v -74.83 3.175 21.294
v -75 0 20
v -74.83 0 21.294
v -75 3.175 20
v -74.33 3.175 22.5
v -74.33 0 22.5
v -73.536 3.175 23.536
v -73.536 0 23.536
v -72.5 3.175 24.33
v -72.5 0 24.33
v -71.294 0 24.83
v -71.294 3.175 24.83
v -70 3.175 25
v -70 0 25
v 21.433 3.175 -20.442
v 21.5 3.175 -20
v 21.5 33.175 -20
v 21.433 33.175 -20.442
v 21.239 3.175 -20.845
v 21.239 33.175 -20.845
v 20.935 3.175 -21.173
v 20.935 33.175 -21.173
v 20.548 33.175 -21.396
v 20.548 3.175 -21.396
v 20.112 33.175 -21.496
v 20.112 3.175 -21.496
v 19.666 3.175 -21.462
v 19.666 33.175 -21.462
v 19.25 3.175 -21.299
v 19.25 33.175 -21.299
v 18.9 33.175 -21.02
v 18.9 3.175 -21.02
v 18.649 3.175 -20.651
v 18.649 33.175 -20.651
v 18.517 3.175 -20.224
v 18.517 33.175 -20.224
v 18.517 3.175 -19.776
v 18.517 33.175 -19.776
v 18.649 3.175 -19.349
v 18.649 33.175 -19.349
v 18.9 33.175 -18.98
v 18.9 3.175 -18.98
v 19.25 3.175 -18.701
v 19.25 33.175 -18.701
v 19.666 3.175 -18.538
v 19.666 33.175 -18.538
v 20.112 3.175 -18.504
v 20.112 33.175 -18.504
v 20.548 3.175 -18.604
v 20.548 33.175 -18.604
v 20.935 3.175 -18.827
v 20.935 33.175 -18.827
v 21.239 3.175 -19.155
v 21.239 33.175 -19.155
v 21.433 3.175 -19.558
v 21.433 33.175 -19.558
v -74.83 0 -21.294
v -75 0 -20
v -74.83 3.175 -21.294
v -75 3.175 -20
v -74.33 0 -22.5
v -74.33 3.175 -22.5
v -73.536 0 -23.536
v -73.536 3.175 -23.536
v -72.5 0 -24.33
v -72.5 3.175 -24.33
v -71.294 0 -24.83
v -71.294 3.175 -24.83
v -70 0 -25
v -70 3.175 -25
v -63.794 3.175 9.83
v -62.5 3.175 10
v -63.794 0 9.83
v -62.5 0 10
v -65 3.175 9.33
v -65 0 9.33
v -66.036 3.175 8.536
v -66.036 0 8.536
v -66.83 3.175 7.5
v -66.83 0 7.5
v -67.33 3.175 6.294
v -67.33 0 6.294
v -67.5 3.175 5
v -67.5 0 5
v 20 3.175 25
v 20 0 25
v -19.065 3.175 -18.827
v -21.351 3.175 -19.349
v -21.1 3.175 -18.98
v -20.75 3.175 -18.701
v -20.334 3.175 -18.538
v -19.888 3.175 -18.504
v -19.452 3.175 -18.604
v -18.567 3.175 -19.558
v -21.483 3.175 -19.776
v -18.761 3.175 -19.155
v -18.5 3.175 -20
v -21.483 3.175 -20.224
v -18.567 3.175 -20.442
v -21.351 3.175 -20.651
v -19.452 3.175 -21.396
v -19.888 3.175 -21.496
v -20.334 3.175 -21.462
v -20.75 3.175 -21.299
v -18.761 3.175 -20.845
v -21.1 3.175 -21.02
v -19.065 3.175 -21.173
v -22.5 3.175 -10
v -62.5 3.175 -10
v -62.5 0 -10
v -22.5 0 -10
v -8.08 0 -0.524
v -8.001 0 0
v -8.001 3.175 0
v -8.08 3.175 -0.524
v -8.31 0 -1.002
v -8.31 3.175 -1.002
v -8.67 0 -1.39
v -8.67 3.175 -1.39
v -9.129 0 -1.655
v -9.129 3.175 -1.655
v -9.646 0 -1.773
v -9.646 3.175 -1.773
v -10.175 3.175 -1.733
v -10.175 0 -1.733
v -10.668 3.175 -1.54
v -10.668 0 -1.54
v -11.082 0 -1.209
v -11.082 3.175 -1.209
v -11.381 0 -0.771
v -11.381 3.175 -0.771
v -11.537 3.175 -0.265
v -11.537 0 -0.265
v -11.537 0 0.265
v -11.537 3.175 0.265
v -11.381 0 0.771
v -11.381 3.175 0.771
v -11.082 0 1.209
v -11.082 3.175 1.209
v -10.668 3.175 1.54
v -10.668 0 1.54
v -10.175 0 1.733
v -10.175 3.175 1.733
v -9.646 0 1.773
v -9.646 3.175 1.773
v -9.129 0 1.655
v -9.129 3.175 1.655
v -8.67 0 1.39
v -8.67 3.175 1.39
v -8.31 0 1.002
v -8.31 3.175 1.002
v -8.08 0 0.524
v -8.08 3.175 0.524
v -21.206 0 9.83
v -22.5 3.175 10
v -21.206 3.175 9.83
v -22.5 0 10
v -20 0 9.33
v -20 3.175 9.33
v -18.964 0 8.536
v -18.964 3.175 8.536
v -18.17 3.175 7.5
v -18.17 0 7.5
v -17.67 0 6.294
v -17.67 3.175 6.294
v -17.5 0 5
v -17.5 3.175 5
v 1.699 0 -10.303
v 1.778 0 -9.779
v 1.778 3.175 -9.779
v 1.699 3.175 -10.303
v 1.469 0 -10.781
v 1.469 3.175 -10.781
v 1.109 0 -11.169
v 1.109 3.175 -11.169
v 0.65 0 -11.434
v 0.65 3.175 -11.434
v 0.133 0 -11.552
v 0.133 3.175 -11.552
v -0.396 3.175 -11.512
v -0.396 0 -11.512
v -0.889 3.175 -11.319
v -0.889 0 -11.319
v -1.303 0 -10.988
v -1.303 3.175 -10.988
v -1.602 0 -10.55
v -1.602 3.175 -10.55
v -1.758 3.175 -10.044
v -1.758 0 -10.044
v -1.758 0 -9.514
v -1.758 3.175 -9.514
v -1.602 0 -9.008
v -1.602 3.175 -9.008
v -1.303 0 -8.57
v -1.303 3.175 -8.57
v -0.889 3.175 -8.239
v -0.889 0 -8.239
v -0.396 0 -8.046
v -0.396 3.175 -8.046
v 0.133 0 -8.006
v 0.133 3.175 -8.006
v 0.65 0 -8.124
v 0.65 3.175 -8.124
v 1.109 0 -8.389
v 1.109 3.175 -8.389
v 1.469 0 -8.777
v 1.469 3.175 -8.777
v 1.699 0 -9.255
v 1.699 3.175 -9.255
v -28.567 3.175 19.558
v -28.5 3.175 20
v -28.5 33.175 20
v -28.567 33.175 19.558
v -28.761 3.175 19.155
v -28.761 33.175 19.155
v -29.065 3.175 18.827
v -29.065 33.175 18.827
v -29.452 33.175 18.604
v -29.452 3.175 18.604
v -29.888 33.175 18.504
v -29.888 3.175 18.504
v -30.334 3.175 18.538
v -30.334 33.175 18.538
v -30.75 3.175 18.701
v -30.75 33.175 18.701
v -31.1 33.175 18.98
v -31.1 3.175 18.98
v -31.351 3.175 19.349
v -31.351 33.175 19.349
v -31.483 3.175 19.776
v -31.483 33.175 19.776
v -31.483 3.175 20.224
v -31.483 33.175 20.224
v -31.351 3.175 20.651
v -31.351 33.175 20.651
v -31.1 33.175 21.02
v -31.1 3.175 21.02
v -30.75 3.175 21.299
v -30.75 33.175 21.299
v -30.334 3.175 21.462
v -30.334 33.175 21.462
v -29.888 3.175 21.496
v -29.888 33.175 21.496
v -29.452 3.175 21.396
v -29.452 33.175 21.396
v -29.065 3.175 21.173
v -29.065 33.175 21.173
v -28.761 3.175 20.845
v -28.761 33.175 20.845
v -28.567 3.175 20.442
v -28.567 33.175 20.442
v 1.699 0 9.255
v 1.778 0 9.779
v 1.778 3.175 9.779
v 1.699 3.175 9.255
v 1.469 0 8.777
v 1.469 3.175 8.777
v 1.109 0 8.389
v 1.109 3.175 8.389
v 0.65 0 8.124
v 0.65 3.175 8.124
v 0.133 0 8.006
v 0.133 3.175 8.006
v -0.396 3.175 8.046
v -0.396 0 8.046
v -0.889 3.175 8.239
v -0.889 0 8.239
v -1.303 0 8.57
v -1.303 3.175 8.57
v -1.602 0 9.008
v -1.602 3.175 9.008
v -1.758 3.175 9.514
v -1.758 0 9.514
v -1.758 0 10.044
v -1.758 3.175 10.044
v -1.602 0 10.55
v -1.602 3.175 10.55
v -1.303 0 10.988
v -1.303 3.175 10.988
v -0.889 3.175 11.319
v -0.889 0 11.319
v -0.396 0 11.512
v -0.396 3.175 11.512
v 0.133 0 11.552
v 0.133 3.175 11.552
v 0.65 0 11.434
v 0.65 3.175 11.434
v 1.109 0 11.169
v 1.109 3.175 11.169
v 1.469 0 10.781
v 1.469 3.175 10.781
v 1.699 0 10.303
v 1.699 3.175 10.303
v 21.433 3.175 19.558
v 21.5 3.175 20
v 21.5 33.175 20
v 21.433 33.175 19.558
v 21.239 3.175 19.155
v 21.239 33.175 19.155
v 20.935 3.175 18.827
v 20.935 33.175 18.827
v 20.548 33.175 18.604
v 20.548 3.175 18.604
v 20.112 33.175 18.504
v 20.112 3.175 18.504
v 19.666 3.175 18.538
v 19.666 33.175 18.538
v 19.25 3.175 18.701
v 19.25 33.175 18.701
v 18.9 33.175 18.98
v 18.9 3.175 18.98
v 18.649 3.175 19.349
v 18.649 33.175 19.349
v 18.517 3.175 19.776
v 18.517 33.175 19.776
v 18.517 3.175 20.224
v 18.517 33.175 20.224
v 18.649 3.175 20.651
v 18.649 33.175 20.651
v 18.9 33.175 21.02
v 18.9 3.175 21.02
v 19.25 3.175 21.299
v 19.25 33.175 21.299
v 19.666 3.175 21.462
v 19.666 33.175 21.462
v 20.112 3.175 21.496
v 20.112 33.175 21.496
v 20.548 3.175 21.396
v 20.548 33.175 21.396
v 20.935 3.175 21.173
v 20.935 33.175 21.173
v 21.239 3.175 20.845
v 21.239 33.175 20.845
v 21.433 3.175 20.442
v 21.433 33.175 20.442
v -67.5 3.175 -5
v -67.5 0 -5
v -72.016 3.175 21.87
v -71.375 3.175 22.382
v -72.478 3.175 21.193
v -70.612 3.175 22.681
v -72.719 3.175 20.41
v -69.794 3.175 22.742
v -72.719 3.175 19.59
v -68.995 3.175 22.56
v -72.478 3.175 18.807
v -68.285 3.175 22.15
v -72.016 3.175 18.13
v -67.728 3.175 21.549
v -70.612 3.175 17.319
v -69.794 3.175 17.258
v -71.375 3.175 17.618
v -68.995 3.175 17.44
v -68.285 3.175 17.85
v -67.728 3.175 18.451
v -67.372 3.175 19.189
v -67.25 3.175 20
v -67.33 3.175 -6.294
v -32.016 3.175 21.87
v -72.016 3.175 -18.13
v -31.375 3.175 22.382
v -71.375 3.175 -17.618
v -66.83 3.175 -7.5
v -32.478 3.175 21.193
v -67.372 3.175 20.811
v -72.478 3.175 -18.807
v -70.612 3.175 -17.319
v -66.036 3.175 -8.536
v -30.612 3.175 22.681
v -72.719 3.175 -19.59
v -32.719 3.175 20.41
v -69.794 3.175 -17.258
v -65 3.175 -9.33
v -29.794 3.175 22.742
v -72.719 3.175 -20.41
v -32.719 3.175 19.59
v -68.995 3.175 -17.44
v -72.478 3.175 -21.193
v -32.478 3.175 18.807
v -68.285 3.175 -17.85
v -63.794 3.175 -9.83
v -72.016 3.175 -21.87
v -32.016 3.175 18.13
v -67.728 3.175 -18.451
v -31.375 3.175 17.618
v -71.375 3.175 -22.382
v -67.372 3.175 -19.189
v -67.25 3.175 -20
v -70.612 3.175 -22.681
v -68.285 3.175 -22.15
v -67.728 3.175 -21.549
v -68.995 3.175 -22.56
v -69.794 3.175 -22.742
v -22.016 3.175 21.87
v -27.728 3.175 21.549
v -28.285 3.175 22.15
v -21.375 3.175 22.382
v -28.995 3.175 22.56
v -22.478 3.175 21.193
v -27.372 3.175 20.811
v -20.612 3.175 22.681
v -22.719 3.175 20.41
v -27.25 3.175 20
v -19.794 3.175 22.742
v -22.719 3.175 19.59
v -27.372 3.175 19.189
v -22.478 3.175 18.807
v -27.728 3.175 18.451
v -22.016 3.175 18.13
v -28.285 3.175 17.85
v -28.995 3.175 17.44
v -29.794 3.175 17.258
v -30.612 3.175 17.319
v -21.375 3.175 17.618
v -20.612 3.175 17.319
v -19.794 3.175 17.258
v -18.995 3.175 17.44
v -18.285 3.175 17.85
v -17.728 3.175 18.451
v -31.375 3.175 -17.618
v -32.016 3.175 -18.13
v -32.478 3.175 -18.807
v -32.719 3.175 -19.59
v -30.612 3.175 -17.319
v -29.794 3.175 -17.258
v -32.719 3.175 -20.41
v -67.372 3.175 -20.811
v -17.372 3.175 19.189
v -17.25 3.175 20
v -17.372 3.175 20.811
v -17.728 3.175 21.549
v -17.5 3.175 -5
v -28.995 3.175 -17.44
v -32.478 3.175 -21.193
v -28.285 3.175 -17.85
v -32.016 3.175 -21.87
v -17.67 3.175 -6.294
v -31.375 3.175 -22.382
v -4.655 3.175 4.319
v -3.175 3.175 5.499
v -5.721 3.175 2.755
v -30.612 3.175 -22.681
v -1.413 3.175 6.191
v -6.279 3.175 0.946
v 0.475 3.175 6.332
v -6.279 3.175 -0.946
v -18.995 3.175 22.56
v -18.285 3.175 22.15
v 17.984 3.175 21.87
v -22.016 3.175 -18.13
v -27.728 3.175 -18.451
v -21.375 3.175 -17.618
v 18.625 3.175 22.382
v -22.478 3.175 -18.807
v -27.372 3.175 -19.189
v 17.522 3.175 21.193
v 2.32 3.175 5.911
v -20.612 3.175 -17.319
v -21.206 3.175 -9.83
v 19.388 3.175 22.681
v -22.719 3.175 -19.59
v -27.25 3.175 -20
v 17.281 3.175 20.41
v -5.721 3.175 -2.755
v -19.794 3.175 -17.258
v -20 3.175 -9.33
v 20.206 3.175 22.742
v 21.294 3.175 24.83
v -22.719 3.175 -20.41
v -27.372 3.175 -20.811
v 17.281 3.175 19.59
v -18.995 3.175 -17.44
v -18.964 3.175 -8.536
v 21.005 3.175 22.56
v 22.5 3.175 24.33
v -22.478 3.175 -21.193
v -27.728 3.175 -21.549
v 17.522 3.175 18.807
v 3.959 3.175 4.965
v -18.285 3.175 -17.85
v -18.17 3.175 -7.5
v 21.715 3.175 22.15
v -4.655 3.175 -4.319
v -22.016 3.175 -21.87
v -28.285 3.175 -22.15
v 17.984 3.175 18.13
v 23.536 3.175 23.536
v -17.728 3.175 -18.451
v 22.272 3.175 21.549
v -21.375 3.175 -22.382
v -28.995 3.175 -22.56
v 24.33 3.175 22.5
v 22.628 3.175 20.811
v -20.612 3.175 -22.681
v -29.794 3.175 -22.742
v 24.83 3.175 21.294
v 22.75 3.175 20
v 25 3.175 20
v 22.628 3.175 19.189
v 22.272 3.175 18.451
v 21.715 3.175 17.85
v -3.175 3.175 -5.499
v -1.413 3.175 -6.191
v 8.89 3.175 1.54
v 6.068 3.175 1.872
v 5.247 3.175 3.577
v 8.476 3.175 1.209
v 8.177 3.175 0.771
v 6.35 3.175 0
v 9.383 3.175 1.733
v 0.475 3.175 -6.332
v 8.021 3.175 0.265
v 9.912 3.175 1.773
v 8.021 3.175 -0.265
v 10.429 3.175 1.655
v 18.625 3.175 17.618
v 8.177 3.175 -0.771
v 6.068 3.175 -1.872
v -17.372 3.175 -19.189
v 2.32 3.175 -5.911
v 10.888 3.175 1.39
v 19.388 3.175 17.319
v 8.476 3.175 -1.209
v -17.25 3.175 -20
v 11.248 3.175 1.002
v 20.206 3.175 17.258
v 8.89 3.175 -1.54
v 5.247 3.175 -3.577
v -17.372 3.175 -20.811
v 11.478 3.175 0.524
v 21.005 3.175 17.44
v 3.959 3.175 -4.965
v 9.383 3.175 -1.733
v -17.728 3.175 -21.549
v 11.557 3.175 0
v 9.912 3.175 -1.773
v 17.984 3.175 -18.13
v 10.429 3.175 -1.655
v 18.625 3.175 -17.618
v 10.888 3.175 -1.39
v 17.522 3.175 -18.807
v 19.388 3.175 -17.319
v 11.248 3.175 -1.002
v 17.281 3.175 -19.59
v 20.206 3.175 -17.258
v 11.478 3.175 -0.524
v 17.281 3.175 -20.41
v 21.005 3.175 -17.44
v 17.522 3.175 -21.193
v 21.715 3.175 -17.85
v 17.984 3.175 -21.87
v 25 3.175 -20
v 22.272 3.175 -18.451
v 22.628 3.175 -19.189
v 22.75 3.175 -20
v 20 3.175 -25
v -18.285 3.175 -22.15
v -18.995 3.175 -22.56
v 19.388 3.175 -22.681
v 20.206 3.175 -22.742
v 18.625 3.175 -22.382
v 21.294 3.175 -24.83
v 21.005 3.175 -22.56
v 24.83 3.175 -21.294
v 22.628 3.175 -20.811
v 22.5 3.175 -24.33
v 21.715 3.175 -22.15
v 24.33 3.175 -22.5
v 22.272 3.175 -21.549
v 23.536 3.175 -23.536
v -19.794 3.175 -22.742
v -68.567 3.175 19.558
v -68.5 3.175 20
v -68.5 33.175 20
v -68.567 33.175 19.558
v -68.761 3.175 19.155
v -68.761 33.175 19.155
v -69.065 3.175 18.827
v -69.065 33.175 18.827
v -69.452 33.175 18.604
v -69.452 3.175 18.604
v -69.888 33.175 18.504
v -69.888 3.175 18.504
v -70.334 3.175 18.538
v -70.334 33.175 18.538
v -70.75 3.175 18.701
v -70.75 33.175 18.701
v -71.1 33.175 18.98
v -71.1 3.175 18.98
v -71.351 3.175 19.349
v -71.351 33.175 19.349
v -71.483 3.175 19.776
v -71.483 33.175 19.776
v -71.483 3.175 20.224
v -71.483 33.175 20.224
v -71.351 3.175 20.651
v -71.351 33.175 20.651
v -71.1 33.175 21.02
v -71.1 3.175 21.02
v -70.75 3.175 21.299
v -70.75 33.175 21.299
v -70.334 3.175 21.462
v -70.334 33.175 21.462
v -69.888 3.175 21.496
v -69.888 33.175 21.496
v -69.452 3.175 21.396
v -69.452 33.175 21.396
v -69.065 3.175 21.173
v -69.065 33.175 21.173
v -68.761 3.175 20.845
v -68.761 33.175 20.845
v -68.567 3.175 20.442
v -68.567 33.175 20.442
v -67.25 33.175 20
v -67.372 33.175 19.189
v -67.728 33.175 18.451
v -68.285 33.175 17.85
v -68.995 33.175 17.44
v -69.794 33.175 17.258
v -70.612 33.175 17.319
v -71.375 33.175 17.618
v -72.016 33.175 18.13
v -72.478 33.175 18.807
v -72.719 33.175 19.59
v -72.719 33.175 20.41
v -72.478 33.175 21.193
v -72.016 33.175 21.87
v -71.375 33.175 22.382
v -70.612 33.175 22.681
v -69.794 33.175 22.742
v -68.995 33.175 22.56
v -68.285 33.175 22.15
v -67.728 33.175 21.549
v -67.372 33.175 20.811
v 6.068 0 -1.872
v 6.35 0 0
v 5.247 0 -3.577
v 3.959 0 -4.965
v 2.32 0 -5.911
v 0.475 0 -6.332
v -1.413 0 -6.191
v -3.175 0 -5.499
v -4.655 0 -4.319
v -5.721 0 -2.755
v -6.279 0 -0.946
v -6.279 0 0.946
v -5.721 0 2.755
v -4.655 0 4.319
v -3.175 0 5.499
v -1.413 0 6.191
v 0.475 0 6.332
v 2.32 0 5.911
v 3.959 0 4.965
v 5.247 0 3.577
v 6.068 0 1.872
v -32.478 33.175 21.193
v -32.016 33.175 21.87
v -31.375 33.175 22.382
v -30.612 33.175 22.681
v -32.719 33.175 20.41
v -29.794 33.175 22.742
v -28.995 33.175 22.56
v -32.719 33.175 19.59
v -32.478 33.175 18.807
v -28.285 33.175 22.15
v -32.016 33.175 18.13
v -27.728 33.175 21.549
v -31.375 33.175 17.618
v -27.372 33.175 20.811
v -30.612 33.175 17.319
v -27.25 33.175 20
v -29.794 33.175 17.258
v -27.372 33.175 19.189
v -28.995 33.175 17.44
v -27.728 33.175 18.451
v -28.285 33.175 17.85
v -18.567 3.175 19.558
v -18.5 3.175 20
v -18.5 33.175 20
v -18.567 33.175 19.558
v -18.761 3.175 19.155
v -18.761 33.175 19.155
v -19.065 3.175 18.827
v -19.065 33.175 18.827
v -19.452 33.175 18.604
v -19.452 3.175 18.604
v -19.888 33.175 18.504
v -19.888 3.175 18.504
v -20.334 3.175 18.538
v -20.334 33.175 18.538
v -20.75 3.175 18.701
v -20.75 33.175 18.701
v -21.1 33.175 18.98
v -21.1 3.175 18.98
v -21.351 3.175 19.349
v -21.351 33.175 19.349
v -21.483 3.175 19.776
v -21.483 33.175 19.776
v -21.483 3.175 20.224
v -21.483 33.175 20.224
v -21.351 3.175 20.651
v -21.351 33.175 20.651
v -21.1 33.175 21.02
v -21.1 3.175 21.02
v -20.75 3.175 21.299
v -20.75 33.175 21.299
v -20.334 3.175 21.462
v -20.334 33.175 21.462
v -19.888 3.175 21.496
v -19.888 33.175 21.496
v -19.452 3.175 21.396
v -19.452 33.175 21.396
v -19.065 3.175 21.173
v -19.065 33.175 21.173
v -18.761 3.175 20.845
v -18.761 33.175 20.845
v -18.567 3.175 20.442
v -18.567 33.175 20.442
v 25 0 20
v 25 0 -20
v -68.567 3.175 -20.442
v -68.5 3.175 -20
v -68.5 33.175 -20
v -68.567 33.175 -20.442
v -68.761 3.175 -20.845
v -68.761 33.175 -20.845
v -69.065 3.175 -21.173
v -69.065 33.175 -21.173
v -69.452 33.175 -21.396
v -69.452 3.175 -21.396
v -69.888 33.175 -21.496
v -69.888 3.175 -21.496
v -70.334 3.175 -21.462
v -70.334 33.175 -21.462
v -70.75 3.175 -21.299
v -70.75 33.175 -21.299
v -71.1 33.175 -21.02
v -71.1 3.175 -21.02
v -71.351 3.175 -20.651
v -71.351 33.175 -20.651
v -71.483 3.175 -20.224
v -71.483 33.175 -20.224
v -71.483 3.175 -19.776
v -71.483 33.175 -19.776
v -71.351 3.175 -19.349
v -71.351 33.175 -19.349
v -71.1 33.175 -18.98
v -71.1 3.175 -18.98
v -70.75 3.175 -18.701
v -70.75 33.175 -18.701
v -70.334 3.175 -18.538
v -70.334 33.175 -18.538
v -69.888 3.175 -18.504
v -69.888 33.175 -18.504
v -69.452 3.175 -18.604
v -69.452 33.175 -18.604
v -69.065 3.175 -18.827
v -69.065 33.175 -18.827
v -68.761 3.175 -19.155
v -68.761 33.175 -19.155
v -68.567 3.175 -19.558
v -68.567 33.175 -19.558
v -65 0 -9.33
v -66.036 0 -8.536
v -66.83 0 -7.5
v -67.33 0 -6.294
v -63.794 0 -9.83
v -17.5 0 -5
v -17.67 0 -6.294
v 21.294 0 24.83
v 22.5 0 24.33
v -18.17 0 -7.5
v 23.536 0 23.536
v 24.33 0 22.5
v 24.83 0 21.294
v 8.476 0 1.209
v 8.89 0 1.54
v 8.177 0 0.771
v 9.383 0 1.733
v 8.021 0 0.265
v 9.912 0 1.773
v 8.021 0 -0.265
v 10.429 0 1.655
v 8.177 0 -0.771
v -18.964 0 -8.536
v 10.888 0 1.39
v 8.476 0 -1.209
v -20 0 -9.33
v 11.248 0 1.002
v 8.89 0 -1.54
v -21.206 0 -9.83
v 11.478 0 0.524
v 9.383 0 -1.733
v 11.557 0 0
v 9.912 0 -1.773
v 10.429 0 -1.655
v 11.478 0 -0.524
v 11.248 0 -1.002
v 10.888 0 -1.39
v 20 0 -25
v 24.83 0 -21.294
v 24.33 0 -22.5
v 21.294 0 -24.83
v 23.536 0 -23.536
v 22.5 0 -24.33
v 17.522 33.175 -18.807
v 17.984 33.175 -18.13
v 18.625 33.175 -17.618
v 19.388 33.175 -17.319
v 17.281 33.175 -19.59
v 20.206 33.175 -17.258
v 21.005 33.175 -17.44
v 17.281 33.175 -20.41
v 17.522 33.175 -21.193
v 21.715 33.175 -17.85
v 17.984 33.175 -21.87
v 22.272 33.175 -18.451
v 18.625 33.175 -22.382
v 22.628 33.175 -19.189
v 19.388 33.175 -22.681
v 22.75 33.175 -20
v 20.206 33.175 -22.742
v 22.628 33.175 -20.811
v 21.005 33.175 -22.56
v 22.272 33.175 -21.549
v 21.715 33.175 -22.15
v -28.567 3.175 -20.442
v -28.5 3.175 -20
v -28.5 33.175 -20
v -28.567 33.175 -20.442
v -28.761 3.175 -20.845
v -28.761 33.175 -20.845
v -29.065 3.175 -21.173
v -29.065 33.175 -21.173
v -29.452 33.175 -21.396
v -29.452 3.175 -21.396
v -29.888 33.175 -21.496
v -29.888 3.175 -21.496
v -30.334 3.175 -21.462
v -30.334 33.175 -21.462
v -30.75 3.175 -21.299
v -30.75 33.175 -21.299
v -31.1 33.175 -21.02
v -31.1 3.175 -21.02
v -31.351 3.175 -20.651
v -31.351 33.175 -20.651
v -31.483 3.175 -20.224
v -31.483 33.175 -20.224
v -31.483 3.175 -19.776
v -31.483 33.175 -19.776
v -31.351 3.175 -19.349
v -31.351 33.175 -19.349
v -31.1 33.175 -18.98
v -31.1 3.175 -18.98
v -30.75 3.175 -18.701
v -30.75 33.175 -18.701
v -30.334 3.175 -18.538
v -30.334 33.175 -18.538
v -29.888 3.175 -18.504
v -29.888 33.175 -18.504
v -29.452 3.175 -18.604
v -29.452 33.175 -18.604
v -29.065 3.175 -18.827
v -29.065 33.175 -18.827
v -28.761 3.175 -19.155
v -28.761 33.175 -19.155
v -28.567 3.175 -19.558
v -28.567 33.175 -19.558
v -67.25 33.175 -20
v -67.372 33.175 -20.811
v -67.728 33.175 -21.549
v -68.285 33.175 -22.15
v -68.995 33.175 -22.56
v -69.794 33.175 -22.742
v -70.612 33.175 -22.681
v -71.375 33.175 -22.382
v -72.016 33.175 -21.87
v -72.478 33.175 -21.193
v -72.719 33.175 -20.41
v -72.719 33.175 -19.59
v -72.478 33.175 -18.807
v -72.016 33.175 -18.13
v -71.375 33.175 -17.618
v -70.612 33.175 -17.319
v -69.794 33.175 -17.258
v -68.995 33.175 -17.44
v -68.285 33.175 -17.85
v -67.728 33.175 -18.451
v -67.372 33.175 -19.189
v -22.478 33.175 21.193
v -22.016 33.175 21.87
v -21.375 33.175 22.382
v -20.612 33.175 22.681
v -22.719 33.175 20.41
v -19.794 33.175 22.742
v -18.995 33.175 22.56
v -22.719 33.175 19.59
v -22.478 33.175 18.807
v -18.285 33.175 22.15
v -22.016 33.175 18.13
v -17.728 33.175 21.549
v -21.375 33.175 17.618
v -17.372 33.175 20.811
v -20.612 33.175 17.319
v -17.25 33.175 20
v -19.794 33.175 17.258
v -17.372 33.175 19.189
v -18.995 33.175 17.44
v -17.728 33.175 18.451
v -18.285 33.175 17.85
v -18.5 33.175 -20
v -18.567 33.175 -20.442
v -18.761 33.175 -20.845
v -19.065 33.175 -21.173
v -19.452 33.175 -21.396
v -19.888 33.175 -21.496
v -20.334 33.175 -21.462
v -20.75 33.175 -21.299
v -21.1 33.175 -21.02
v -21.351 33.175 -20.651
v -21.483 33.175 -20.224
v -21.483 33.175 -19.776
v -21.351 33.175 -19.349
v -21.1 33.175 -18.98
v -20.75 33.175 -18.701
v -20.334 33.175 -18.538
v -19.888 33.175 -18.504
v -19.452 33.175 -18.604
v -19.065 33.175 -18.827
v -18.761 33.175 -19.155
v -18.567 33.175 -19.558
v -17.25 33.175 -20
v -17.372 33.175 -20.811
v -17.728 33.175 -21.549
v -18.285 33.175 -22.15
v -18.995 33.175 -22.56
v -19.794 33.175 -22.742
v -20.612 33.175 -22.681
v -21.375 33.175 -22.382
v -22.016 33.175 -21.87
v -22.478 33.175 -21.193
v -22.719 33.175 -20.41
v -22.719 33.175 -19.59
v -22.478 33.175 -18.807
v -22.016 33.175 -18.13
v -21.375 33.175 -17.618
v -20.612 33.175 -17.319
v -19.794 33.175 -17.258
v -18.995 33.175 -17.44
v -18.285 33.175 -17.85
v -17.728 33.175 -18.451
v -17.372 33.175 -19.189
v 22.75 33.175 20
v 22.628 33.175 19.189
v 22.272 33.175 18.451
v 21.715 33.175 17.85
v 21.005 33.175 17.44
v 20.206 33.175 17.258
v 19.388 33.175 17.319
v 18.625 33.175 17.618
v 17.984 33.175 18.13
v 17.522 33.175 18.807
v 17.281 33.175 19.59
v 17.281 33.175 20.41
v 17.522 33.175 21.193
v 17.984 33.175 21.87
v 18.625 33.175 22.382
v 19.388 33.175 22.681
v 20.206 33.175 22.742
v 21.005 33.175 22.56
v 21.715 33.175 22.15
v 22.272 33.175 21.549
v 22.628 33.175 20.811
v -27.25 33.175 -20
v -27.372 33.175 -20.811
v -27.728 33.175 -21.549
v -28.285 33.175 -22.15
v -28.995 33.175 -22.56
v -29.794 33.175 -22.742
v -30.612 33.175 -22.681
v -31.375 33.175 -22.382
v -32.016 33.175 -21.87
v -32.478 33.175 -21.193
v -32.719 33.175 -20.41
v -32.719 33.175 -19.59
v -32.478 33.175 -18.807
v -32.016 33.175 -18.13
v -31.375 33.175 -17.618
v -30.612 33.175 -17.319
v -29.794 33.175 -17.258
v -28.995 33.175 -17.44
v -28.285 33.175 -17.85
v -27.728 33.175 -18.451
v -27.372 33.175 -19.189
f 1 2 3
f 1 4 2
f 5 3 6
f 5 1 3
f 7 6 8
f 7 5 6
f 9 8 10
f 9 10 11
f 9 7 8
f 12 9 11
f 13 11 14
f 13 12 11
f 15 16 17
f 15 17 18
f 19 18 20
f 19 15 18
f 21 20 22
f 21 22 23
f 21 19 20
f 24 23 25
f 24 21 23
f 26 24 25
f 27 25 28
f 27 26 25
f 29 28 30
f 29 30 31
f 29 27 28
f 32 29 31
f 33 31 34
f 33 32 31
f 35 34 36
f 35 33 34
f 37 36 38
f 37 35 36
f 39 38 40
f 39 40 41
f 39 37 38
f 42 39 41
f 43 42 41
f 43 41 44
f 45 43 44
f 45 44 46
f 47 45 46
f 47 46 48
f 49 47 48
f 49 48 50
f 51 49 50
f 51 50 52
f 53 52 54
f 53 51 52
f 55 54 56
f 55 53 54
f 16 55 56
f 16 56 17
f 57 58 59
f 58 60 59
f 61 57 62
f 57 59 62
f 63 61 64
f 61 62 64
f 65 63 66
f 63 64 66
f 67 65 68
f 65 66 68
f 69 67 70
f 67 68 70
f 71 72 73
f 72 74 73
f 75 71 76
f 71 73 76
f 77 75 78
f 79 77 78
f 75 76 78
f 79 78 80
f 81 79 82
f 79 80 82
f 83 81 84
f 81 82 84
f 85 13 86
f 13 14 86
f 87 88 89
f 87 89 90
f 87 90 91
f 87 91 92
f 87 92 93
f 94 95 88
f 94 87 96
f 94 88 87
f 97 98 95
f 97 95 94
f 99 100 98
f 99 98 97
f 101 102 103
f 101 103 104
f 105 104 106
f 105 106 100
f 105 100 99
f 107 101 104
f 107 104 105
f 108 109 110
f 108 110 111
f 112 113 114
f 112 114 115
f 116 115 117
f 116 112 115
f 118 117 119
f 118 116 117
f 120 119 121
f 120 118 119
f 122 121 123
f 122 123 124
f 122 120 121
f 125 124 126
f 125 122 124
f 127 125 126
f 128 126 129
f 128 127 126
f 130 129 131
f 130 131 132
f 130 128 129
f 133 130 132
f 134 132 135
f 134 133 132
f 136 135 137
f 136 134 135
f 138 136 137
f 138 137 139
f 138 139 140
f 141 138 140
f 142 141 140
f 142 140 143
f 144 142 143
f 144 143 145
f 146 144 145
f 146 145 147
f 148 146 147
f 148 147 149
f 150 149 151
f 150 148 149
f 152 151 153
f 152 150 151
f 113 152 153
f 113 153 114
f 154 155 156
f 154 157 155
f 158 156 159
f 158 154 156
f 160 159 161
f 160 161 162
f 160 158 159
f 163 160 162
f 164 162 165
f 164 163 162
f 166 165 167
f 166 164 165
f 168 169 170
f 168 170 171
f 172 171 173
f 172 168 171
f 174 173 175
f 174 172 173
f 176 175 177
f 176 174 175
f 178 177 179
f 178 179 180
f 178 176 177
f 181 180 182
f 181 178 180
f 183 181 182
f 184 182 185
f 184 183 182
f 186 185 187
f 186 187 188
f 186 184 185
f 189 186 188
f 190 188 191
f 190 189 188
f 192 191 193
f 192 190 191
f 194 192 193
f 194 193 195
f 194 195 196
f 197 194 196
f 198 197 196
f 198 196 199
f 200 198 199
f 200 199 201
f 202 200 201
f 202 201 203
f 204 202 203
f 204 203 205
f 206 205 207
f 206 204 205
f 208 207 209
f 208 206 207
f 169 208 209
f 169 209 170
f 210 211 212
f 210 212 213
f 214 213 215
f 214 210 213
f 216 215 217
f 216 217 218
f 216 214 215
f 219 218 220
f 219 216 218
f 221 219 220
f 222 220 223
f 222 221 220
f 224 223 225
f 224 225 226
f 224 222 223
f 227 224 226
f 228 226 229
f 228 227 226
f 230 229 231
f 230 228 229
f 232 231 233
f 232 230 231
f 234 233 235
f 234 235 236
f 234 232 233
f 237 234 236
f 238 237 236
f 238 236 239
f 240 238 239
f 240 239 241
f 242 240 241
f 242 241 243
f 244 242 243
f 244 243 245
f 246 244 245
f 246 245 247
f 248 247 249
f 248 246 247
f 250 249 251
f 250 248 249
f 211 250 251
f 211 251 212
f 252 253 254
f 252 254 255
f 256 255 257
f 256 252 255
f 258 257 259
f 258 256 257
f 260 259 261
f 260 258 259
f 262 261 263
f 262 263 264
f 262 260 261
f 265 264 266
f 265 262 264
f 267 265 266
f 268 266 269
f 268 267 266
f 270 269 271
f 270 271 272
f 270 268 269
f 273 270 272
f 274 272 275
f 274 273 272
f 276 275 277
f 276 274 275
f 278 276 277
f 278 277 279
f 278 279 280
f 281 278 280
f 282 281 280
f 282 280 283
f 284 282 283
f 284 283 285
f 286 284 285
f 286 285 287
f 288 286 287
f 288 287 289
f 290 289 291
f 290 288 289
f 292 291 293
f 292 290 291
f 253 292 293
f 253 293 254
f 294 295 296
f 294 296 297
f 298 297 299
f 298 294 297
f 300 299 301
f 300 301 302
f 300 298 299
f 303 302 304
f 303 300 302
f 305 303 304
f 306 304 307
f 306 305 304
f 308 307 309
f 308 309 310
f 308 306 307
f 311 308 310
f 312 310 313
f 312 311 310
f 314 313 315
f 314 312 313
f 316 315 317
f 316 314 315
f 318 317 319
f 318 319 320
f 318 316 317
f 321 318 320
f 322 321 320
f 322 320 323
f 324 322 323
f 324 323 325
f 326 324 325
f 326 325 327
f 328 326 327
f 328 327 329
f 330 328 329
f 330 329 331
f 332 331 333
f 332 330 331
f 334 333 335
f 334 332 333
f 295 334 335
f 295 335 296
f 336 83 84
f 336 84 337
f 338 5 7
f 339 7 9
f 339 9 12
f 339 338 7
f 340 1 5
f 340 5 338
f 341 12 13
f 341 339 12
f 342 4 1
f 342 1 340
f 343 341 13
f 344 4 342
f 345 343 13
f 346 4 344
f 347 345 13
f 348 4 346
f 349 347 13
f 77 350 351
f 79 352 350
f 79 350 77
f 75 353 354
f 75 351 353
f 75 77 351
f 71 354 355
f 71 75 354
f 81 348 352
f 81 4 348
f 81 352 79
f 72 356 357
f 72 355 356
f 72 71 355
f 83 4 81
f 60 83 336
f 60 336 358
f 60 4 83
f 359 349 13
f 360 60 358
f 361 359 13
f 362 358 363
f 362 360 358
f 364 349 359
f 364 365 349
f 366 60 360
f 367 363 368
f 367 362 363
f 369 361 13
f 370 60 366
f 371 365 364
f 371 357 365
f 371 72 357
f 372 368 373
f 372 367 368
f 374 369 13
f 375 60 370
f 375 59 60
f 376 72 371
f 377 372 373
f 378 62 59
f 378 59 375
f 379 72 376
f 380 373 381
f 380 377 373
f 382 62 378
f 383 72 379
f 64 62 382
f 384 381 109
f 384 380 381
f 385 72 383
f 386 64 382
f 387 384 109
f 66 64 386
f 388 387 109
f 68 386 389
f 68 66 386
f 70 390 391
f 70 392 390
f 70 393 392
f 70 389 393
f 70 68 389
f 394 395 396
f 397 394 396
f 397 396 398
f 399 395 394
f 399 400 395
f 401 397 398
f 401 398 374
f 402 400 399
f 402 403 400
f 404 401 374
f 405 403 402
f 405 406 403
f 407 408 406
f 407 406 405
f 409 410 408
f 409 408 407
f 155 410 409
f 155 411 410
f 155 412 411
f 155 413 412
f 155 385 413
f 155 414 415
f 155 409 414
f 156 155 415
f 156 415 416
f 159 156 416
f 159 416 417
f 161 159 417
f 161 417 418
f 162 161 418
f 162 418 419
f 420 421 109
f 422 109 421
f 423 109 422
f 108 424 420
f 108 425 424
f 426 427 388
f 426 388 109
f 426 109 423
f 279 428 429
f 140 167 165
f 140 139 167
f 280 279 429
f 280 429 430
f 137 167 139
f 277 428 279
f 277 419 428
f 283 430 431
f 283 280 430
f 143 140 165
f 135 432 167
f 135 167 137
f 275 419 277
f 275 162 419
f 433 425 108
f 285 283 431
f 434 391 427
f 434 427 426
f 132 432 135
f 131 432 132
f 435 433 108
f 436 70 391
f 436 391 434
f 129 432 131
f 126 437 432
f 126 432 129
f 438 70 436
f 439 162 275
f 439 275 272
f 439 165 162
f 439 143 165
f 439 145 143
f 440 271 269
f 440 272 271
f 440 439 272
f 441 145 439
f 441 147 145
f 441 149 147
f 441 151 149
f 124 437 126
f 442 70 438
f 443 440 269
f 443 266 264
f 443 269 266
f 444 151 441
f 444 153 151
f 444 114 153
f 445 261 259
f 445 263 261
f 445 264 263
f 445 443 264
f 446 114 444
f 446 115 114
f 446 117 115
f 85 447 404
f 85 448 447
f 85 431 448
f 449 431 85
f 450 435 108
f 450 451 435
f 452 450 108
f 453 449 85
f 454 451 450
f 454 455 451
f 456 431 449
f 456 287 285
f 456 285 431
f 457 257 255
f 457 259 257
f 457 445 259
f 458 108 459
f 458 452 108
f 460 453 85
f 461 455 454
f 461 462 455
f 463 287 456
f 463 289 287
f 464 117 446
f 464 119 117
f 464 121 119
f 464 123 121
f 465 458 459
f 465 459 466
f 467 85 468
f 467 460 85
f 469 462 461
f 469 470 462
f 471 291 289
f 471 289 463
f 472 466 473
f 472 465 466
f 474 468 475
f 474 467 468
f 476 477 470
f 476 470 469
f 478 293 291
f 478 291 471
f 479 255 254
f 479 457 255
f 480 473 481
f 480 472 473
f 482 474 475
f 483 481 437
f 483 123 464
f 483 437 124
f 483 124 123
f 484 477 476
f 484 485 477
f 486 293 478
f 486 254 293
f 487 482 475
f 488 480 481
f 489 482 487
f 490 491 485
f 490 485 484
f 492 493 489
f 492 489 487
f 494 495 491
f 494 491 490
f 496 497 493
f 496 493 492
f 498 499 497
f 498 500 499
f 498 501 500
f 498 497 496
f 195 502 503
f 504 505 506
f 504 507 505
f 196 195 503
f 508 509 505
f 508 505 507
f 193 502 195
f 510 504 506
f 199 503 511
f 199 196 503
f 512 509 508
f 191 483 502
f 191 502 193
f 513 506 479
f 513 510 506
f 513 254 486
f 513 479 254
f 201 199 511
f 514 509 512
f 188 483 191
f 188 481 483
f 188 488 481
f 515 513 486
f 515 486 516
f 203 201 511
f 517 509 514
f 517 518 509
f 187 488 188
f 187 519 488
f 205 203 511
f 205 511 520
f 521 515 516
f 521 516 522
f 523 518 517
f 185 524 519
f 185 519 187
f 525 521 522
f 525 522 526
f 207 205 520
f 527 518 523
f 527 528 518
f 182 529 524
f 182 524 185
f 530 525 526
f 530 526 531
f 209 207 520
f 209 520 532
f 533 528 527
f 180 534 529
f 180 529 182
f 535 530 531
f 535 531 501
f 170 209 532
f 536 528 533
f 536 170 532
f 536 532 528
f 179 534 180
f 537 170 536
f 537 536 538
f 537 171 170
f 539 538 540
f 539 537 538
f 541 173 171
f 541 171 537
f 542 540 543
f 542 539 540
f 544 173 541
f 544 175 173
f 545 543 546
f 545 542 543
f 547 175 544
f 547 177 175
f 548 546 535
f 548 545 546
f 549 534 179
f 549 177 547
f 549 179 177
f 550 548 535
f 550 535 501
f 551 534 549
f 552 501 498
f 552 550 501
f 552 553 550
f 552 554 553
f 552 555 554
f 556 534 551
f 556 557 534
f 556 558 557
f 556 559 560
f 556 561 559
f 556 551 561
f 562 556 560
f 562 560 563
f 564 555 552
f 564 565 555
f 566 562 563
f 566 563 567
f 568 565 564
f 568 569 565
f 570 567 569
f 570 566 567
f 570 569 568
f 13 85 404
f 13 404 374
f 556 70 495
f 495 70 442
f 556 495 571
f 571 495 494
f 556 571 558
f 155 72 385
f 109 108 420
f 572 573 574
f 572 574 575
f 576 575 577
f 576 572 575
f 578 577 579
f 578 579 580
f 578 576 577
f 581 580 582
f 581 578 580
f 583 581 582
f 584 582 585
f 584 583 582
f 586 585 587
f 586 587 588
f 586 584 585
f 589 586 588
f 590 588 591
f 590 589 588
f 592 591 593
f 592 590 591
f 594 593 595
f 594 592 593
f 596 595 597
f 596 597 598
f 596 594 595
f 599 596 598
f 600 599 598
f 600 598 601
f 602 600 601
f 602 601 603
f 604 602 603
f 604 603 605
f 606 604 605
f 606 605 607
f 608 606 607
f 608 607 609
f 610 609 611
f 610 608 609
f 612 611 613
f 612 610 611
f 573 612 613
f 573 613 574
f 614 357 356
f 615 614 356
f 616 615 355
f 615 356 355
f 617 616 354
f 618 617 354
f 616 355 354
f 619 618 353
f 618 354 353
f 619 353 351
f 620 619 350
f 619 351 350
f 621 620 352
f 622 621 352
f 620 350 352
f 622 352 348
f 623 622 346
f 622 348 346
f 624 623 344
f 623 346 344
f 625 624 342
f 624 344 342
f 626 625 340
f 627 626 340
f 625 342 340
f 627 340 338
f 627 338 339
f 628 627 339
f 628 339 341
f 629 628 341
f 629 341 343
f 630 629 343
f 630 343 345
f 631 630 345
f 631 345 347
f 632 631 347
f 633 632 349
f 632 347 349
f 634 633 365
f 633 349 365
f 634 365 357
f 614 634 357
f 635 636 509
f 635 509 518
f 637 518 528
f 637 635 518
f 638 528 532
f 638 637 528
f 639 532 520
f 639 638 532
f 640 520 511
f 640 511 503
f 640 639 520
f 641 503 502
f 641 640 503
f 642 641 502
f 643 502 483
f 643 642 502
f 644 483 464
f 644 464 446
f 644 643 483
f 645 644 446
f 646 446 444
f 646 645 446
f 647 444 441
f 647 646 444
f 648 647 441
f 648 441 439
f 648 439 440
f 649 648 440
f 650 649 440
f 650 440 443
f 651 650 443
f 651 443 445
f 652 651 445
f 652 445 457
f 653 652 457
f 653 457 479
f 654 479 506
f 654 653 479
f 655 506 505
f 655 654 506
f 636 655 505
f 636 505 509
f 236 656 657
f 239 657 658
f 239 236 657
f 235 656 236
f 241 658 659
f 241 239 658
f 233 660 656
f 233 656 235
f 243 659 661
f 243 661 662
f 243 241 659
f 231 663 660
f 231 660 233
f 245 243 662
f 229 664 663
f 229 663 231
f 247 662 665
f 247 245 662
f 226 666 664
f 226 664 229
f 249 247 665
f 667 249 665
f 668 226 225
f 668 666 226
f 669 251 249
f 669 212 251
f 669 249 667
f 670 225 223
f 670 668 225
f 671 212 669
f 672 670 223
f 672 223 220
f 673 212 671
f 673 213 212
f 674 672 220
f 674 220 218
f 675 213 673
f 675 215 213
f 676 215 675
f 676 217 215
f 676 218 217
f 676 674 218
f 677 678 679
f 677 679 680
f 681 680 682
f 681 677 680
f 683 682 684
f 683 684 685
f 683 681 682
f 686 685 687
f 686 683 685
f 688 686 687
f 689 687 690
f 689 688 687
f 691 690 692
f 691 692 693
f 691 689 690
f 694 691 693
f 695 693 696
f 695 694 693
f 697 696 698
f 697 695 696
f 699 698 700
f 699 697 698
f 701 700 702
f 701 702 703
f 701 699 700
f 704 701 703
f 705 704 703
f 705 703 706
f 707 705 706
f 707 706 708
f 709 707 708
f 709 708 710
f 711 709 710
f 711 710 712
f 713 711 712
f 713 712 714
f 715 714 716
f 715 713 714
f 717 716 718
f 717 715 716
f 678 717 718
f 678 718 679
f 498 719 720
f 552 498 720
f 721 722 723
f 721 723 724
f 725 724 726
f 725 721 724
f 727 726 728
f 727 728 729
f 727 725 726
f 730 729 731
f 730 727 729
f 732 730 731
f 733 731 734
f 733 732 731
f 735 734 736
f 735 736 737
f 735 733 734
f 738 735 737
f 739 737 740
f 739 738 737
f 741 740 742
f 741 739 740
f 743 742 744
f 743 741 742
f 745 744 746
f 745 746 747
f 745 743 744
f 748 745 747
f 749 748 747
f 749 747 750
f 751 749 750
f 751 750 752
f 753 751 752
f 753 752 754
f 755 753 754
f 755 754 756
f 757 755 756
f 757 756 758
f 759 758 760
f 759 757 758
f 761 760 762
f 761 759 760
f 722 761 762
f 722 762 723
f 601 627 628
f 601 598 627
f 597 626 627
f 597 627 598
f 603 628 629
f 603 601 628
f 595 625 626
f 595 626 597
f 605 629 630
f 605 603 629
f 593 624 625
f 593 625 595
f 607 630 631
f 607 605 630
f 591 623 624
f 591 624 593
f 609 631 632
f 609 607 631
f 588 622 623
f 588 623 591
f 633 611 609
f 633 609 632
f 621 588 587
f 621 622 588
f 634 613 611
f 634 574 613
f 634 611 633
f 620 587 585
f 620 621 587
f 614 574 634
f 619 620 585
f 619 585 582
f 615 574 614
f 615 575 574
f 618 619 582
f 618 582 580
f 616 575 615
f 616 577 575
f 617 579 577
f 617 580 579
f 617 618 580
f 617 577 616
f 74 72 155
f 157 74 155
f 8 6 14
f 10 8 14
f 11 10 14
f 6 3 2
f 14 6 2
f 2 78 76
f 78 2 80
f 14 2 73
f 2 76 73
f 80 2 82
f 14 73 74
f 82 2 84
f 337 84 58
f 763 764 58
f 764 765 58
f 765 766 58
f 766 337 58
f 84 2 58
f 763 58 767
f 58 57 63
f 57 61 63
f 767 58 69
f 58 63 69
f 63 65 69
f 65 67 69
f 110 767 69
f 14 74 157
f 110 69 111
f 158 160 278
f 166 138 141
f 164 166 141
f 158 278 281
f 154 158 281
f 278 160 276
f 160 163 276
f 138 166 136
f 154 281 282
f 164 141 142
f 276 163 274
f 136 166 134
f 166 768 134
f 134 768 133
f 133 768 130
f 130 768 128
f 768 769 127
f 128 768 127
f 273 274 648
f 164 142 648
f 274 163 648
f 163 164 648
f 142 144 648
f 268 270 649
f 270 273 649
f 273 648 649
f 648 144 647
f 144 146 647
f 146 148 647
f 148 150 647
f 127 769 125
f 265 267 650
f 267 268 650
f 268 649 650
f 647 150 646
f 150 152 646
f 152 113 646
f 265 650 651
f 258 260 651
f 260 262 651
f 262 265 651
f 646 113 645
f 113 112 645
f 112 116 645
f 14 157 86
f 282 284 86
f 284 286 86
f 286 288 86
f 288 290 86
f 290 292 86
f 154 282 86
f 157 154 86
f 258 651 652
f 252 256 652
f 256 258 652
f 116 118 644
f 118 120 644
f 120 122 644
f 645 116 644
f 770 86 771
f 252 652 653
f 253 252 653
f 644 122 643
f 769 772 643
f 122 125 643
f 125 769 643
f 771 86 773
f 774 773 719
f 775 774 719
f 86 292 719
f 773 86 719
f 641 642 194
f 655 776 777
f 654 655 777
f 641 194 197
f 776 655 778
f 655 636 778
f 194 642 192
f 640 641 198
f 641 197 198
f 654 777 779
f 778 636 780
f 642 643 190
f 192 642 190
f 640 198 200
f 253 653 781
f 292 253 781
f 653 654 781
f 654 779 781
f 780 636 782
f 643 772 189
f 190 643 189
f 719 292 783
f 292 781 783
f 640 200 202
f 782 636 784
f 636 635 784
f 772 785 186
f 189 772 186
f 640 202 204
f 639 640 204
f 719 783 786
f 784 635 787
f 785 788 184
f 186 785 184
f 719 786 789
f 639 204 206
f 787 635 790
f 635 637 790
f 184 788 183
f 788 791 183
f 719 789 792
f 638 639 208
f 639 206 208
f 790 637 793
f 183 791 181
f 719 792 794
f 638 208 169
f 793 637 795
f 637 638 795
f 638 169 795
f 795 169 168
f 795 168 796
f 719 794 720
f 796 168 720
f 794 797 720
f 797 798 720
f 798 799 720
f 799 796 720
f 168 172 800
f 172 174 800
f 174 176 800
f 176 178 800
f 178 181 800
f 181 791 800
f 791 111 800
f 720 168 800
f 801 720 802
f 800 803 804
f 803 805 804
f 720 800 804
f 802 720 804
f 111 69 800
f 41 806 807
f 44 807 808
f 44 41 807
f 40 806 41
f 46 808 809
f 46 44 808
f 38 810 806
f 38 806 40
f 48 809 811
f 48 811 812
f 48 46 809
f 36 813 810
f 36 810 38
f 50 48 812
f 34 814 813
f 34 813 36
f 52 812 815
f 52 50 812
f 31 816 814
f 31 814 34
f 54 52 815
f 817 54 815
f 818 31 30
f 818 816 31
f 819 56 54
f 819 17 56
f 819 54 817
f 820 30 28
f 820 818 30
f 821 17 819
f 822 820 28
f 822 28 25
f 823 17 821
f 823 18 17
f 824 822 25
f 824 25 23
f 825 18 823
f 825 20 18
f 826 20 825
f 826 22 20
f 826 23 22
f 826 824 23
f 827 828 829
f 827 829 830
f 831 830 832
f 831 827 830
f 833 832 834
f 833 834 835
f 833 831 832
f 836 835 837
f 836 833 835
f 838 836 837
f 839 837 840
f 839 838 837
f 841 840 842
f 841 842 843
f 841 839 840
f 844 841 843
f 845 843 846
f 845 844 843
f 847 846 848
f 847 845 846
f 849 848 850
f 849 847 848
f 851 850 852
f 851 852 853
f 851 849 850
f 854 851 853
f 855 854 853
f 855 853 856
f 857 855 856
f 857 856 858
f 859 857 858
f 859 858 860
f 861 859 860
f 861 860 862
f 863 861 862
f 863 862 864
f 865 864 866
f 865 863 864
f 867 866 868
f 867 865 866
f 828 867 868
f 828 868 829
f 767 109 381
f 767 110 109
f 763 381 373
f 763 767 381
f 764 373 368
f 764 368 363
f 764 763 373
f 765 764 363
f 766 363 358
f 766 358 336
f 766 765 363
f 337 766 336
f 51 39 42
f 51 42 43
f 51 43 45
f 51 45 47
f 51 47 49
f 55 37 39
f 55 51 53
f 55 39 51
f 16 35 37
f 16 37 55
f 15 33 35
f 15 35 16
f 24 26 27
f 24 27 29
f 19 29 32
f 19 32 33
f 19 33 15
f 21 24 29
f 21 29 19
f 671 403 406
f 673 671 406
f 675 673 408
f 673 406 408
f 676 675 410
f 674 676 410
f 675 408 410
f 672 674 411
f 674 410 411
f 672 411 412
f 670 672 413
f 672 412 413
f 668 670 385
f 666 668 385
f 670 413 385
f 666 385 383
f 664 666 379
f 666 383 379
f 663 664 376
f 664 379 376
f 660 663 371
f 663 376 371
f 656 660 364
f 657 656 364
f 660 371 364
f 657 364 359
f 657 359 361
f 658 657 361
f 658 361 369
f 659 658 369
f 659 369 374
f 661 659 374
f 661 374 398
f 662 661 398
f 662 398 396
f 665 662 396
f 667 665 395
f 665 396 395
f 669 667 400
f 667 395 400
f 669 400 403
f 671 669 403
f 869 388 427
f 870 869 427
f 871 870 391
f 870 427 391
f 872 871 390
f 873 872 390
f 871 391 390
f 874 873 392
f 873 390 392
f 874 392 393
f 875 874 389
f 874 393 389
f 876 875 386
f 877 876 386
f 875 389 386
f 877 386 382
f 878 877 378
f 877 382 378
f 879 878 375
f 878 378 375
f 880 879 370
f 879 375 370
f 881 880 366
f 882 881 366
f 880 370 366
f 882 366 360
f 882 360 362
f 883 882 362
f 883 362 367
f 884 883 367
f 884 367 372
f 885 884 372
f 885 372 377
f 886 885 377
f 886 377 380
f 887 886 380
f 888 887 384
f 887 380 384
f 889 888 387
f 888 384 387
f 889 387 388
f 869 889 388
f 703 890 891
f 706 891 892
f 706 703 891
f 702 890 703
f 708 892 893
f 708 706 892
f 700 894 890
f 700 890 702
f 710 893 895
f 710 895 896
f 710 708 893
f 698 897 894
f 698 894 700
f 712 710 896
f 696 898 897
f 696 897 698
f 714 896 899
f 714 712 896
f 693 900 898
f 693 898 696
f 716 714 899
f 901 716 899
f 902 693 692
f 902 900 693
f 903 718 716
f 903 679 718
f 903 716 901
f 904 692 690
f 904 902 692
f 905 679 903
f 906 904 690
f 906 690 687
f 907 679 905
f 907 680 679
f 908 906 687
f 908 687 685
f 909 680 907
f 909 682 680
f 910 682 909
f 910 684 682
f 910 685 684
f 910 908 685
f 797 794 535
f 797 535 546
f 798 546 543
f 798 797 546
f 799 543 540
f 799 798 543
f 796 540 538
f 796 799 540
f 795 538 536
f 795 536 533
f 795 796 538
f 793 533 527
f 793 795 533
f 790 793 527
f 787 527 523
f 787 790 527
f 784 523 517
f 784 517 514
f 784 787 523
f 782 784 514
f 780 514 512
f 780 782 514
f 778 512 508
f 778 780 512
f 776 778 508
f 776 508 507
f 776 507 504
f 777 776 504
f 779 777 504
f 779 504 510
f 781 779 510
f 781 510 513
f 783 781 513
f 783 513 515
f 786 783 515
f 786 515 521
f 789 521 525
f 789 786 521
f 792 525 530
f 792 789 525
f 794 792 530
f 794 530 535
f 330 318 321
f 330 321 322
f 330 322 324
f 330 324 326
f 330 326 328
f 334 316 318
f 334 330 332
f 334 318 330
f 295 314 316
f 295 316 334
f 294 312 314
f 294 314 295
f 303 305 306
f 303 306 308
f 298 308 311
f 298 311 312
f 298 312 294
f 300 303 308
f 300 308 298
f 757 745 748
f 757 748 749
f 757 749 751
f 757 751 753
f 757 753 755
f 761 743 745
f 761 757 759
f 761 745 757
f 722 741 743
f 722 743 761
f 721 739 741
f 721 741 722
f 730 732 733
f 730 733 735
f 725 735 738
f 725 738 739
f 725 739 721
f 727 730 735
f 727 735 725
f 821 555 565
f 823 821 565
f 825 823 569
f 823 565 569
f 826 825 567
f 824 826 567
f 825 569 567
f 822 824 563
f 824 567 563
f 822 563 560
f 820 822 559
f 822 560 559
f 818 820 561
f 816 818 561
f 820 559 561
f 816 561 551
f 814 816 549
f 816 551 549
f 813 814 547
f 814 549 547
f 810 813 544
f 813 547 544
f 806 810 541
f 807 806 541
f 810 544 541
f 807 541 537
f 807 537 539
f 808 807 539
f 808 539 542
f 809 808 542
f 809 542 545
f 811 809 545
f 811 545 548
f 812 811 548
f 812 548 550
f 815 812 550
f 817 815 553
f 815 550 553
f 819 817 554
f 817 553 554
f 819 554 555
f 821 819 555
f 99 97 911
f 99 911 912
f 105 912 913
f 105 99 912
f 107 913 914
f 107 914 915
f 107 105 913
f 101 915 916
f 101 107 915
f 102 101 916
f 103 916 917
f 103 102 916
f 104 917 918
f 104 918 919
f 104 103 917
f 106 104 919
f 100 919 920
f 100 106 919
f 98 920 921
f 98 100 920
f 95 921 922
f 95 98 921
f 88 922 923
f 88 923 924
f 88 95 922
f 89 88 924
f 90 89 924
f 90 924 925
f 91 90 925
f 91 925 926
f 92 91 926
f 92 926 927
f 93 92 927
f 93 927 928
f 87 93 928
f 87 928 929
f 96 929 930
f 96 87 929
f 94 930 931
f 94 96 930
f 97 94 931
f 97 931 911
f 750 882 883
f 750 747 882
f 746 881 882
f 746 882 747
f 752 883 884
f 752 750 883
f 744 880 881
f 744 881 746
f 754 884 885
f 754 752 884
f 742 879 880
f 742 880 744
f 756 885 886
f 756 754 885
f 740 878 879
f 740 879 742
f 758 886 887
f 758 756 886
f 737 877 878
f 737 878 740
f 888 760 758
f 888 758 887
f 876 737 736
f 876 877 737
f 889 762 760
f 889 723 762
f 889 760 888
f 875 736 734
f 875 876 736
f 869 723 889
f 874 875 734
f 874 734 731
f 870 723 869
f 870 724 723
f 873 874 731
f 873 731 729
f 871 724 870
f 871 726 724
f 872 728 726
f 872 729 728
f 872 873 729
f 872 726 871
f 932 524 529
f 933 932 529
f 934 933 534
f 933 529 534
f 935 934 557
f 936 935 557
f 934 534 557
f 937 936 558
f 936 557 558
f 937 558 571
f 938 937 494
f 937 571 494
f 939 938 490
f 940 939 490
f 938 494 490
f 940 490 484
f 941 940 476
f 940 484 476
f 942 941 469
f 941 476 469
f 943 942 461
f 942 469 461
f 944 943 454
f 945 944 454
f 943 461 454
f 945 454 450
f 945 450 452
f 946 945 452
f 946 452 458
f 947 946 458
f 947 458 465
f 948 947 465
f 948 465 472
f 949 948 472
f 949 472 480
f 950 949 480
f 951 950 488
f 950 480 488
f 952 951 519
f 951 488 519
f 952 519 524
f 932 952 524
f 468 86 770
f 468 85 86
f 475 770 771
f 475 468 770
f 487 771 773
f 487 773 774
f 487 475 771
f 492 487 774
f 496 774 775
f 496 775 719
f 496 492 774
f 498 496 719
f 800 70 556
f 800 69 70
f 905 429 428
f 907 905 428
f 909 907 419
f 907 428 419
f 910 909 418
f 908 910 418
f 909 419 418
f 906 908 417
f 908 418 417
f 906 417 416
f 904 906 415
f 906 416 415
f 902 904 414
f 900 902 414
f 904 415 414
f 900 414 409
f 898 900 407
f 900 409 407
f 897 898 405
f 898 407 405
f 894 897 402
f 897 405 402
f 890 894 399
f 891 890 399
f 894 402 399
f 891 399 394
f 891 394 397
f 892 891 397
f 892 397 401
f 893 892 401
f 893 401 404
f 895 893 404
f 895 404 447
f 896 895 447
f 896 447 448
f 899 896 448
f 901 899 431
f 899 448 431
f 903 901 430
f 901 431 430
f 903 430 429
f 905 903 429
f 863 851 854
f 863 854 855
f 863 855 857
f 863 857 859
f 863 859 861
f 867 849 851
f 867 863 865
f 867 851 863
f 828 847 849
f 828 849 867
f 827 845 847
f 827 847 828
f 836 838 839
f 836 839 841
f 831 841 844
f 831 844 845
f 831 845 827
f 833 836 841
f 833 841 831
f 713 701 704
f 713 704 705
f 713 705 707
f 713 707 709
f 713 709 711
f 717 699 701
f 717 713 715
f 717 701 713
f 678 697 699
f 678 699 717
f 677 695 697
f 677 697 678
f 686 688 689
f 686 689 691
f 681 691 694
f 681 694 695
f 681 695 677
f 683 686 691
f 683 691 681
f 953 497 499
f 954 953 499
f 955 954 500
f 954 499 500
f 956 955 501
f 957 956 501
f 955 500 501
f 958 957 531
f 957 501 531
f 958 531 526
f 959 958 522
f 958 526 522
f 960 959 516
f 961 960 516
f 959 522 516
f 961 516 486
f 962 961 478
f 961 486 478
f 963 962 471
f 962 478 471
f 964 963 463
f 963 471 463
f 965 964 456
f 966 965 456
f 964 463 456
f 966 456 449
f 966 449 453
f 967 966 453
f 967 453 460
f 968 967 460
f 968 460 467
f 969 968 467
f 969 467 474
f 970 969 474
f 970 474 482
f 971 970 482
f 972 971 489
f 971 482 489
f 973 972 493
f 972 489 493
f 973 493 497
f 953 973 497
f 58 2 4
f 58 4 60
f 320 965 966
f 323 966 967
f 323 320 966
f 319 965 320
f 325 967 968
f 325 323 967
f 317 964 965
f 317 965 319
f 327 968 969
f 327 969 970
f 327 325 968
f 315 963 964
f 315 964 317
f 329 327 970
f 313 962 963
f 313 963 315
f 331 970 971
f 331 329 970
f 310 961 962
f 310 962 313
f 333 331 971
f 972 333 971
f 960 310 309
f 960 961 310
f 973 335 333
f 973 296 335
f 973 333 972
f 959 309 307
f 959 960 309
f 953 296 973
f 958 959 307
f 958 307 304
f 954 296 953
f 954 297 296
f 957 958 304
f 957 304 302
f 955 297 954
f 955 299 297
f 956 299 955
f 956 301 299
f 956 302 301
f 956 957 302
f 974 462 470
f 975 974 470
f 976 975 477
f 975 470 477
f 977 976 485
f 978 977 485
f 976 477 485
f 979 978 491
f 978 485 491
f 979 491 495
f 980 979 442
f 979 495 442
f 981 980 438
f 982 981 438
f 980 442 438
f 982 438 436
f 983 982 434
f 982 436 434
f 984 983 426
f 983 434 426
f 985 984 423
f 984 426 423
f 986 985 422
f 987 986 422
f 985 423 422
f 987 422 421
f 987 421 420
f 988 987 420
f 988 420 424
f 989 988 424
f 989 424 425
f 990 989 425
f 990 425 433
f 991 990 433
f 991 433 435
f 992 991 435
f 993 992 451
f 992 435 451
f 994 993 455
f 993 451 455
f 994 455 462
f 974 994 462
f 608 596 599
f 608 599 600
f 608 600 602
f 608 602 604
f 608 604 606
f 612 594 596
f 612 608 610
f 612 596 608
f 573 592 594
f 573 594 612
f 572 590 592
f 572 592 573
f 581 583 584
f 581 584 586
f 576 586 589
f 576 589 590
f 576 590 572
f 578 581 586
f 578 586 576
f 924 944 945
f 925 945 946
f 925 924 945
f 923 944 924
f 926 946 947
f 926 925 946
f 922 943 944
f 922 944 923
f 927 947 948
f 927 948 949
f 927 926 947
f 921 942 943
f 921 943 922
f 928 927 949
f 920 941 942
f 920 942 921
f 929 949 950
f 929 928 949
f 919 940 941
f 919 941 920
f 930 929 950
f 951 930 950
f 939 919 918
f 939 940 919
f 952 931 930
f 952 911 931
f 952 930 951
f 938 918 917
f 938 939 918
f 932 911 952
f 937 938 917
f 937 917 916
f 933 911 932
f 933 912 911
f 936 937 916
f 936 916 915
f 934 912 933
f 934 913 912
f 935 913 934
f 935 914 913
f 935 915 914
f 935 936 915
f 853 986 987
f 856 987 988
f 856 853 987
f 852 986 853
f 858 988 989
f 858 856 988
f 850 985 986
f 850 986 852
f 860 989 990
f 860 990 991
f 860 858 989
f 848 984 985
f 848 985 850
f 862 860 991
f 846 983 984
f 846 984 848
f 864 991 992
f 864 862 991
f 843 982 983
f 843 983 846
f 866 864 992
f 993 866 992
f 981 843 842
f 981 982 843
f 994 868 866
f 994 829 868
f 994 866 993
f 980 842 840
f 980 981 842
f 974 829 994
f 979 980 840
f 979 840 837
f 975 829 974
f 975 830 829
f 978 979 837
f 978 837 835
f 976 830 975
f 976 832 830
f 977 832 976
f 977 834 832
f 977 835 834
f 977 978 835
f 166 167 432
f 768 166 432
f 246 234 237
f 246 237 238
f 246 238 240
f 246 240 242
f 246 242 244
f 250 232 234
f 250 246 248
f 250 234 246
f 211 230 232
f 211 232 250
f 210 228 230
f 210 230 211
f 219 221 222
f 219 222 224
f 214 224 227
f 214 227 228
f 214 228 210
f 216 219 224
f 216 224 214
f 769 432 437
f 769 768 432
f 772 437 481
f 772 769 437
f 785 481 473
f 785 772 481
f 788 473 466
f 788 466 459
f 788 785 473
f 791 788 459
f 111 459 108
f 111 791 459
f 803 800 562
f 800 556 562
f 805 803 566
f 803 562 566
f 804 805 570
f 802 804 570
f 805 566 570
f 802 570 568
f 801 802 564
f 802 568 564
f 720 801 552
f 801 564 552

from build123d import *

# Parameters (mm, degrees)
SKETCH1_W           = 50
SKETCH1_H           = 50
SKETCH1_R           = 6.35
SKETCH1_R_2         = 1.778
BOSS_EXTRUDE1_DEPTH = 3.175
SKETCH2_R           = 2.75
SKETCH2_R_2         = 1.5
BOSS_EXTRUDE2_DEPTH = 30
SKETCH3_W           = 50
SKETCH3_H           = 50
BOSS_EXTRUDE3_DEPTH = 3.175
SKETCH4_R           = 2.75
SKETCH4_R_2         = 1.5
BOSS_EXTRUDE4_DEPTH = 30
SKETCH5_W           = 50
SKETCH5_H           = 20
CUT_EXTRUDE1_DEPTH  = 10
FILLET1_R           = 5


with BuildPart() as part:
    # Sketch1 → Boss-Extrude1 (new body)
    with BuildSketch(Plane(origin=(0, 0, 0), x_dir=(1, 0, 0), z_dir=(0, 1, 0))):
        Rectangle(SKETCH1_W, SKETCH1_H)
        Circle(SKETCH1_R, mode=Mode.SUBTRACT)
        with Locations((-9.779, 0)):
            Circle(SKETCH1_R_2, mode=Mode.SUBTRACT)
        with Locations((9.779, 0)):
            Circle(SKETCH1_R_2, mode=Mode.SUBTRACT)
        with Locations((0, 9.779)):
            Circle(SKETCH1_R_2, mode=Mode.SUBTRACT)
        with Locations((0, -9.779)):
            Circle(SKETCH1_R_2, mode=Mode.SUBTRACT)
    extrude(amount=BOSS_EXTRUDE1_DEPTH)

    # Sketch2 → Boss-Extrude2 (add)
    with BuildSketch(Plane(origin=(0, 3.175, 0), x_dir=(1, 0, 0), z_dir=(0, 1, 0))):
        with Locations((20, -20)):
            Circle(SKETCH2_R)
        with Locations((20, -20)):
            Circle(SKETCH2_R_2, mode=Mode.SUBTRACT)
        with Locations((-20, -20)):
            Circle(SKETCH2_R)
        with Locations((-20, -20)):
            Circle(SKETCH2_R_2, mode=Mode.SUBTRACT)
        with Locations((-20, 20)):
            Circle(SKETCH2_R)
        with Locations((-20, 20)):
            Circle(SKETCH2_R_2, mode=Mode.SUBTRACT)
        with Locations((20, 20)):
            Circle(SKETCH2_R)
        with Locations((20, 20)):
            Circle(SKETCH2_R_2, mode=Mode.SUBTRACT)
    extrude(amount=BOSS_EXTRUDE2_DEPTH)

    # Sketch3 → Boss-Extrude3 (add)
    with BuildSketch(Plane(origin=(0, 0, 0), x_dir=(1, 0, 0), z_dir=(0, 1, 0))):
        with Locations((-50, 0)):
            Rectangle(SKETCH3_W, SKETCH3_H)
    extrude(amount=BOSS_EXTRUDE3_DEPTH)

    # Sketch4 → Boss-Extrude4 (add)
    with BuildSketch(Plane(origin=(0, 3.175, 0), x_dir=(1, 0, 0), z_dir=(0, 1, 0))):
        with Locations((-70, 20)):
            Circle(SKETCH4_R)
        with Locations((-70, 20)):
            Circle(SKETCH4_R_2, mode=Mode.SUBTRACT)
        with Locations((-70, -20)):
            Circle(SKETCH4_R)
        with Locations((-70, -20)):
            Circle(SKETCH4_R_2, mode=Mode.SUBTRACT)
        with Locations((-30, -20)):
            Circle(SKETCH4_R)
        with Locations((-30, -20)):
            Circle(SKETCH4_R_2, mode=Mode.SUBTRACT)
        with Locations((-30, 20)):
            Circle(SKETCH4_R)
        with Locations((-30, 20)):
            Circle(SKETCH4_R_2, mode=Mode.SUBTRACT)
    extrude(amount=BOSS_EXTRUDE4_DEPTH)

    # Sketch5 → Cut-Extrude1 (cut)
    with BuildSketch(Plane(origin=(0, 3.175, 0), x_dir=(1, 0, 0), z_dir=(0, 1, 0))):
        with Locations((-42.5, 0)):
            Rectangle(SKETCH5_W, SKETCH5_H)
    extrude(amount=-CUT_EXTRUDE1_DEPTH, mode=Mode.SUBTRACT)

    # Fillet1
    fillet1_edges = [part.edges().sort_by_distance(p)[0] for p in [
        (-67.5, 1.5875, 10),
        (-67.5, 1.5875, -10),
        (-17.5, 1.5875, -10),
        (-17.5, 1.5875, 10),
        (-75, 1.5875, 25),
        (-75, 1.5875, -25),
        (25, 1.5875, 25),
        (25, 1.5875, -25),
    ]]
    fillet(fillet1_edges, radius=FILLET1_R)


solid = part.part
